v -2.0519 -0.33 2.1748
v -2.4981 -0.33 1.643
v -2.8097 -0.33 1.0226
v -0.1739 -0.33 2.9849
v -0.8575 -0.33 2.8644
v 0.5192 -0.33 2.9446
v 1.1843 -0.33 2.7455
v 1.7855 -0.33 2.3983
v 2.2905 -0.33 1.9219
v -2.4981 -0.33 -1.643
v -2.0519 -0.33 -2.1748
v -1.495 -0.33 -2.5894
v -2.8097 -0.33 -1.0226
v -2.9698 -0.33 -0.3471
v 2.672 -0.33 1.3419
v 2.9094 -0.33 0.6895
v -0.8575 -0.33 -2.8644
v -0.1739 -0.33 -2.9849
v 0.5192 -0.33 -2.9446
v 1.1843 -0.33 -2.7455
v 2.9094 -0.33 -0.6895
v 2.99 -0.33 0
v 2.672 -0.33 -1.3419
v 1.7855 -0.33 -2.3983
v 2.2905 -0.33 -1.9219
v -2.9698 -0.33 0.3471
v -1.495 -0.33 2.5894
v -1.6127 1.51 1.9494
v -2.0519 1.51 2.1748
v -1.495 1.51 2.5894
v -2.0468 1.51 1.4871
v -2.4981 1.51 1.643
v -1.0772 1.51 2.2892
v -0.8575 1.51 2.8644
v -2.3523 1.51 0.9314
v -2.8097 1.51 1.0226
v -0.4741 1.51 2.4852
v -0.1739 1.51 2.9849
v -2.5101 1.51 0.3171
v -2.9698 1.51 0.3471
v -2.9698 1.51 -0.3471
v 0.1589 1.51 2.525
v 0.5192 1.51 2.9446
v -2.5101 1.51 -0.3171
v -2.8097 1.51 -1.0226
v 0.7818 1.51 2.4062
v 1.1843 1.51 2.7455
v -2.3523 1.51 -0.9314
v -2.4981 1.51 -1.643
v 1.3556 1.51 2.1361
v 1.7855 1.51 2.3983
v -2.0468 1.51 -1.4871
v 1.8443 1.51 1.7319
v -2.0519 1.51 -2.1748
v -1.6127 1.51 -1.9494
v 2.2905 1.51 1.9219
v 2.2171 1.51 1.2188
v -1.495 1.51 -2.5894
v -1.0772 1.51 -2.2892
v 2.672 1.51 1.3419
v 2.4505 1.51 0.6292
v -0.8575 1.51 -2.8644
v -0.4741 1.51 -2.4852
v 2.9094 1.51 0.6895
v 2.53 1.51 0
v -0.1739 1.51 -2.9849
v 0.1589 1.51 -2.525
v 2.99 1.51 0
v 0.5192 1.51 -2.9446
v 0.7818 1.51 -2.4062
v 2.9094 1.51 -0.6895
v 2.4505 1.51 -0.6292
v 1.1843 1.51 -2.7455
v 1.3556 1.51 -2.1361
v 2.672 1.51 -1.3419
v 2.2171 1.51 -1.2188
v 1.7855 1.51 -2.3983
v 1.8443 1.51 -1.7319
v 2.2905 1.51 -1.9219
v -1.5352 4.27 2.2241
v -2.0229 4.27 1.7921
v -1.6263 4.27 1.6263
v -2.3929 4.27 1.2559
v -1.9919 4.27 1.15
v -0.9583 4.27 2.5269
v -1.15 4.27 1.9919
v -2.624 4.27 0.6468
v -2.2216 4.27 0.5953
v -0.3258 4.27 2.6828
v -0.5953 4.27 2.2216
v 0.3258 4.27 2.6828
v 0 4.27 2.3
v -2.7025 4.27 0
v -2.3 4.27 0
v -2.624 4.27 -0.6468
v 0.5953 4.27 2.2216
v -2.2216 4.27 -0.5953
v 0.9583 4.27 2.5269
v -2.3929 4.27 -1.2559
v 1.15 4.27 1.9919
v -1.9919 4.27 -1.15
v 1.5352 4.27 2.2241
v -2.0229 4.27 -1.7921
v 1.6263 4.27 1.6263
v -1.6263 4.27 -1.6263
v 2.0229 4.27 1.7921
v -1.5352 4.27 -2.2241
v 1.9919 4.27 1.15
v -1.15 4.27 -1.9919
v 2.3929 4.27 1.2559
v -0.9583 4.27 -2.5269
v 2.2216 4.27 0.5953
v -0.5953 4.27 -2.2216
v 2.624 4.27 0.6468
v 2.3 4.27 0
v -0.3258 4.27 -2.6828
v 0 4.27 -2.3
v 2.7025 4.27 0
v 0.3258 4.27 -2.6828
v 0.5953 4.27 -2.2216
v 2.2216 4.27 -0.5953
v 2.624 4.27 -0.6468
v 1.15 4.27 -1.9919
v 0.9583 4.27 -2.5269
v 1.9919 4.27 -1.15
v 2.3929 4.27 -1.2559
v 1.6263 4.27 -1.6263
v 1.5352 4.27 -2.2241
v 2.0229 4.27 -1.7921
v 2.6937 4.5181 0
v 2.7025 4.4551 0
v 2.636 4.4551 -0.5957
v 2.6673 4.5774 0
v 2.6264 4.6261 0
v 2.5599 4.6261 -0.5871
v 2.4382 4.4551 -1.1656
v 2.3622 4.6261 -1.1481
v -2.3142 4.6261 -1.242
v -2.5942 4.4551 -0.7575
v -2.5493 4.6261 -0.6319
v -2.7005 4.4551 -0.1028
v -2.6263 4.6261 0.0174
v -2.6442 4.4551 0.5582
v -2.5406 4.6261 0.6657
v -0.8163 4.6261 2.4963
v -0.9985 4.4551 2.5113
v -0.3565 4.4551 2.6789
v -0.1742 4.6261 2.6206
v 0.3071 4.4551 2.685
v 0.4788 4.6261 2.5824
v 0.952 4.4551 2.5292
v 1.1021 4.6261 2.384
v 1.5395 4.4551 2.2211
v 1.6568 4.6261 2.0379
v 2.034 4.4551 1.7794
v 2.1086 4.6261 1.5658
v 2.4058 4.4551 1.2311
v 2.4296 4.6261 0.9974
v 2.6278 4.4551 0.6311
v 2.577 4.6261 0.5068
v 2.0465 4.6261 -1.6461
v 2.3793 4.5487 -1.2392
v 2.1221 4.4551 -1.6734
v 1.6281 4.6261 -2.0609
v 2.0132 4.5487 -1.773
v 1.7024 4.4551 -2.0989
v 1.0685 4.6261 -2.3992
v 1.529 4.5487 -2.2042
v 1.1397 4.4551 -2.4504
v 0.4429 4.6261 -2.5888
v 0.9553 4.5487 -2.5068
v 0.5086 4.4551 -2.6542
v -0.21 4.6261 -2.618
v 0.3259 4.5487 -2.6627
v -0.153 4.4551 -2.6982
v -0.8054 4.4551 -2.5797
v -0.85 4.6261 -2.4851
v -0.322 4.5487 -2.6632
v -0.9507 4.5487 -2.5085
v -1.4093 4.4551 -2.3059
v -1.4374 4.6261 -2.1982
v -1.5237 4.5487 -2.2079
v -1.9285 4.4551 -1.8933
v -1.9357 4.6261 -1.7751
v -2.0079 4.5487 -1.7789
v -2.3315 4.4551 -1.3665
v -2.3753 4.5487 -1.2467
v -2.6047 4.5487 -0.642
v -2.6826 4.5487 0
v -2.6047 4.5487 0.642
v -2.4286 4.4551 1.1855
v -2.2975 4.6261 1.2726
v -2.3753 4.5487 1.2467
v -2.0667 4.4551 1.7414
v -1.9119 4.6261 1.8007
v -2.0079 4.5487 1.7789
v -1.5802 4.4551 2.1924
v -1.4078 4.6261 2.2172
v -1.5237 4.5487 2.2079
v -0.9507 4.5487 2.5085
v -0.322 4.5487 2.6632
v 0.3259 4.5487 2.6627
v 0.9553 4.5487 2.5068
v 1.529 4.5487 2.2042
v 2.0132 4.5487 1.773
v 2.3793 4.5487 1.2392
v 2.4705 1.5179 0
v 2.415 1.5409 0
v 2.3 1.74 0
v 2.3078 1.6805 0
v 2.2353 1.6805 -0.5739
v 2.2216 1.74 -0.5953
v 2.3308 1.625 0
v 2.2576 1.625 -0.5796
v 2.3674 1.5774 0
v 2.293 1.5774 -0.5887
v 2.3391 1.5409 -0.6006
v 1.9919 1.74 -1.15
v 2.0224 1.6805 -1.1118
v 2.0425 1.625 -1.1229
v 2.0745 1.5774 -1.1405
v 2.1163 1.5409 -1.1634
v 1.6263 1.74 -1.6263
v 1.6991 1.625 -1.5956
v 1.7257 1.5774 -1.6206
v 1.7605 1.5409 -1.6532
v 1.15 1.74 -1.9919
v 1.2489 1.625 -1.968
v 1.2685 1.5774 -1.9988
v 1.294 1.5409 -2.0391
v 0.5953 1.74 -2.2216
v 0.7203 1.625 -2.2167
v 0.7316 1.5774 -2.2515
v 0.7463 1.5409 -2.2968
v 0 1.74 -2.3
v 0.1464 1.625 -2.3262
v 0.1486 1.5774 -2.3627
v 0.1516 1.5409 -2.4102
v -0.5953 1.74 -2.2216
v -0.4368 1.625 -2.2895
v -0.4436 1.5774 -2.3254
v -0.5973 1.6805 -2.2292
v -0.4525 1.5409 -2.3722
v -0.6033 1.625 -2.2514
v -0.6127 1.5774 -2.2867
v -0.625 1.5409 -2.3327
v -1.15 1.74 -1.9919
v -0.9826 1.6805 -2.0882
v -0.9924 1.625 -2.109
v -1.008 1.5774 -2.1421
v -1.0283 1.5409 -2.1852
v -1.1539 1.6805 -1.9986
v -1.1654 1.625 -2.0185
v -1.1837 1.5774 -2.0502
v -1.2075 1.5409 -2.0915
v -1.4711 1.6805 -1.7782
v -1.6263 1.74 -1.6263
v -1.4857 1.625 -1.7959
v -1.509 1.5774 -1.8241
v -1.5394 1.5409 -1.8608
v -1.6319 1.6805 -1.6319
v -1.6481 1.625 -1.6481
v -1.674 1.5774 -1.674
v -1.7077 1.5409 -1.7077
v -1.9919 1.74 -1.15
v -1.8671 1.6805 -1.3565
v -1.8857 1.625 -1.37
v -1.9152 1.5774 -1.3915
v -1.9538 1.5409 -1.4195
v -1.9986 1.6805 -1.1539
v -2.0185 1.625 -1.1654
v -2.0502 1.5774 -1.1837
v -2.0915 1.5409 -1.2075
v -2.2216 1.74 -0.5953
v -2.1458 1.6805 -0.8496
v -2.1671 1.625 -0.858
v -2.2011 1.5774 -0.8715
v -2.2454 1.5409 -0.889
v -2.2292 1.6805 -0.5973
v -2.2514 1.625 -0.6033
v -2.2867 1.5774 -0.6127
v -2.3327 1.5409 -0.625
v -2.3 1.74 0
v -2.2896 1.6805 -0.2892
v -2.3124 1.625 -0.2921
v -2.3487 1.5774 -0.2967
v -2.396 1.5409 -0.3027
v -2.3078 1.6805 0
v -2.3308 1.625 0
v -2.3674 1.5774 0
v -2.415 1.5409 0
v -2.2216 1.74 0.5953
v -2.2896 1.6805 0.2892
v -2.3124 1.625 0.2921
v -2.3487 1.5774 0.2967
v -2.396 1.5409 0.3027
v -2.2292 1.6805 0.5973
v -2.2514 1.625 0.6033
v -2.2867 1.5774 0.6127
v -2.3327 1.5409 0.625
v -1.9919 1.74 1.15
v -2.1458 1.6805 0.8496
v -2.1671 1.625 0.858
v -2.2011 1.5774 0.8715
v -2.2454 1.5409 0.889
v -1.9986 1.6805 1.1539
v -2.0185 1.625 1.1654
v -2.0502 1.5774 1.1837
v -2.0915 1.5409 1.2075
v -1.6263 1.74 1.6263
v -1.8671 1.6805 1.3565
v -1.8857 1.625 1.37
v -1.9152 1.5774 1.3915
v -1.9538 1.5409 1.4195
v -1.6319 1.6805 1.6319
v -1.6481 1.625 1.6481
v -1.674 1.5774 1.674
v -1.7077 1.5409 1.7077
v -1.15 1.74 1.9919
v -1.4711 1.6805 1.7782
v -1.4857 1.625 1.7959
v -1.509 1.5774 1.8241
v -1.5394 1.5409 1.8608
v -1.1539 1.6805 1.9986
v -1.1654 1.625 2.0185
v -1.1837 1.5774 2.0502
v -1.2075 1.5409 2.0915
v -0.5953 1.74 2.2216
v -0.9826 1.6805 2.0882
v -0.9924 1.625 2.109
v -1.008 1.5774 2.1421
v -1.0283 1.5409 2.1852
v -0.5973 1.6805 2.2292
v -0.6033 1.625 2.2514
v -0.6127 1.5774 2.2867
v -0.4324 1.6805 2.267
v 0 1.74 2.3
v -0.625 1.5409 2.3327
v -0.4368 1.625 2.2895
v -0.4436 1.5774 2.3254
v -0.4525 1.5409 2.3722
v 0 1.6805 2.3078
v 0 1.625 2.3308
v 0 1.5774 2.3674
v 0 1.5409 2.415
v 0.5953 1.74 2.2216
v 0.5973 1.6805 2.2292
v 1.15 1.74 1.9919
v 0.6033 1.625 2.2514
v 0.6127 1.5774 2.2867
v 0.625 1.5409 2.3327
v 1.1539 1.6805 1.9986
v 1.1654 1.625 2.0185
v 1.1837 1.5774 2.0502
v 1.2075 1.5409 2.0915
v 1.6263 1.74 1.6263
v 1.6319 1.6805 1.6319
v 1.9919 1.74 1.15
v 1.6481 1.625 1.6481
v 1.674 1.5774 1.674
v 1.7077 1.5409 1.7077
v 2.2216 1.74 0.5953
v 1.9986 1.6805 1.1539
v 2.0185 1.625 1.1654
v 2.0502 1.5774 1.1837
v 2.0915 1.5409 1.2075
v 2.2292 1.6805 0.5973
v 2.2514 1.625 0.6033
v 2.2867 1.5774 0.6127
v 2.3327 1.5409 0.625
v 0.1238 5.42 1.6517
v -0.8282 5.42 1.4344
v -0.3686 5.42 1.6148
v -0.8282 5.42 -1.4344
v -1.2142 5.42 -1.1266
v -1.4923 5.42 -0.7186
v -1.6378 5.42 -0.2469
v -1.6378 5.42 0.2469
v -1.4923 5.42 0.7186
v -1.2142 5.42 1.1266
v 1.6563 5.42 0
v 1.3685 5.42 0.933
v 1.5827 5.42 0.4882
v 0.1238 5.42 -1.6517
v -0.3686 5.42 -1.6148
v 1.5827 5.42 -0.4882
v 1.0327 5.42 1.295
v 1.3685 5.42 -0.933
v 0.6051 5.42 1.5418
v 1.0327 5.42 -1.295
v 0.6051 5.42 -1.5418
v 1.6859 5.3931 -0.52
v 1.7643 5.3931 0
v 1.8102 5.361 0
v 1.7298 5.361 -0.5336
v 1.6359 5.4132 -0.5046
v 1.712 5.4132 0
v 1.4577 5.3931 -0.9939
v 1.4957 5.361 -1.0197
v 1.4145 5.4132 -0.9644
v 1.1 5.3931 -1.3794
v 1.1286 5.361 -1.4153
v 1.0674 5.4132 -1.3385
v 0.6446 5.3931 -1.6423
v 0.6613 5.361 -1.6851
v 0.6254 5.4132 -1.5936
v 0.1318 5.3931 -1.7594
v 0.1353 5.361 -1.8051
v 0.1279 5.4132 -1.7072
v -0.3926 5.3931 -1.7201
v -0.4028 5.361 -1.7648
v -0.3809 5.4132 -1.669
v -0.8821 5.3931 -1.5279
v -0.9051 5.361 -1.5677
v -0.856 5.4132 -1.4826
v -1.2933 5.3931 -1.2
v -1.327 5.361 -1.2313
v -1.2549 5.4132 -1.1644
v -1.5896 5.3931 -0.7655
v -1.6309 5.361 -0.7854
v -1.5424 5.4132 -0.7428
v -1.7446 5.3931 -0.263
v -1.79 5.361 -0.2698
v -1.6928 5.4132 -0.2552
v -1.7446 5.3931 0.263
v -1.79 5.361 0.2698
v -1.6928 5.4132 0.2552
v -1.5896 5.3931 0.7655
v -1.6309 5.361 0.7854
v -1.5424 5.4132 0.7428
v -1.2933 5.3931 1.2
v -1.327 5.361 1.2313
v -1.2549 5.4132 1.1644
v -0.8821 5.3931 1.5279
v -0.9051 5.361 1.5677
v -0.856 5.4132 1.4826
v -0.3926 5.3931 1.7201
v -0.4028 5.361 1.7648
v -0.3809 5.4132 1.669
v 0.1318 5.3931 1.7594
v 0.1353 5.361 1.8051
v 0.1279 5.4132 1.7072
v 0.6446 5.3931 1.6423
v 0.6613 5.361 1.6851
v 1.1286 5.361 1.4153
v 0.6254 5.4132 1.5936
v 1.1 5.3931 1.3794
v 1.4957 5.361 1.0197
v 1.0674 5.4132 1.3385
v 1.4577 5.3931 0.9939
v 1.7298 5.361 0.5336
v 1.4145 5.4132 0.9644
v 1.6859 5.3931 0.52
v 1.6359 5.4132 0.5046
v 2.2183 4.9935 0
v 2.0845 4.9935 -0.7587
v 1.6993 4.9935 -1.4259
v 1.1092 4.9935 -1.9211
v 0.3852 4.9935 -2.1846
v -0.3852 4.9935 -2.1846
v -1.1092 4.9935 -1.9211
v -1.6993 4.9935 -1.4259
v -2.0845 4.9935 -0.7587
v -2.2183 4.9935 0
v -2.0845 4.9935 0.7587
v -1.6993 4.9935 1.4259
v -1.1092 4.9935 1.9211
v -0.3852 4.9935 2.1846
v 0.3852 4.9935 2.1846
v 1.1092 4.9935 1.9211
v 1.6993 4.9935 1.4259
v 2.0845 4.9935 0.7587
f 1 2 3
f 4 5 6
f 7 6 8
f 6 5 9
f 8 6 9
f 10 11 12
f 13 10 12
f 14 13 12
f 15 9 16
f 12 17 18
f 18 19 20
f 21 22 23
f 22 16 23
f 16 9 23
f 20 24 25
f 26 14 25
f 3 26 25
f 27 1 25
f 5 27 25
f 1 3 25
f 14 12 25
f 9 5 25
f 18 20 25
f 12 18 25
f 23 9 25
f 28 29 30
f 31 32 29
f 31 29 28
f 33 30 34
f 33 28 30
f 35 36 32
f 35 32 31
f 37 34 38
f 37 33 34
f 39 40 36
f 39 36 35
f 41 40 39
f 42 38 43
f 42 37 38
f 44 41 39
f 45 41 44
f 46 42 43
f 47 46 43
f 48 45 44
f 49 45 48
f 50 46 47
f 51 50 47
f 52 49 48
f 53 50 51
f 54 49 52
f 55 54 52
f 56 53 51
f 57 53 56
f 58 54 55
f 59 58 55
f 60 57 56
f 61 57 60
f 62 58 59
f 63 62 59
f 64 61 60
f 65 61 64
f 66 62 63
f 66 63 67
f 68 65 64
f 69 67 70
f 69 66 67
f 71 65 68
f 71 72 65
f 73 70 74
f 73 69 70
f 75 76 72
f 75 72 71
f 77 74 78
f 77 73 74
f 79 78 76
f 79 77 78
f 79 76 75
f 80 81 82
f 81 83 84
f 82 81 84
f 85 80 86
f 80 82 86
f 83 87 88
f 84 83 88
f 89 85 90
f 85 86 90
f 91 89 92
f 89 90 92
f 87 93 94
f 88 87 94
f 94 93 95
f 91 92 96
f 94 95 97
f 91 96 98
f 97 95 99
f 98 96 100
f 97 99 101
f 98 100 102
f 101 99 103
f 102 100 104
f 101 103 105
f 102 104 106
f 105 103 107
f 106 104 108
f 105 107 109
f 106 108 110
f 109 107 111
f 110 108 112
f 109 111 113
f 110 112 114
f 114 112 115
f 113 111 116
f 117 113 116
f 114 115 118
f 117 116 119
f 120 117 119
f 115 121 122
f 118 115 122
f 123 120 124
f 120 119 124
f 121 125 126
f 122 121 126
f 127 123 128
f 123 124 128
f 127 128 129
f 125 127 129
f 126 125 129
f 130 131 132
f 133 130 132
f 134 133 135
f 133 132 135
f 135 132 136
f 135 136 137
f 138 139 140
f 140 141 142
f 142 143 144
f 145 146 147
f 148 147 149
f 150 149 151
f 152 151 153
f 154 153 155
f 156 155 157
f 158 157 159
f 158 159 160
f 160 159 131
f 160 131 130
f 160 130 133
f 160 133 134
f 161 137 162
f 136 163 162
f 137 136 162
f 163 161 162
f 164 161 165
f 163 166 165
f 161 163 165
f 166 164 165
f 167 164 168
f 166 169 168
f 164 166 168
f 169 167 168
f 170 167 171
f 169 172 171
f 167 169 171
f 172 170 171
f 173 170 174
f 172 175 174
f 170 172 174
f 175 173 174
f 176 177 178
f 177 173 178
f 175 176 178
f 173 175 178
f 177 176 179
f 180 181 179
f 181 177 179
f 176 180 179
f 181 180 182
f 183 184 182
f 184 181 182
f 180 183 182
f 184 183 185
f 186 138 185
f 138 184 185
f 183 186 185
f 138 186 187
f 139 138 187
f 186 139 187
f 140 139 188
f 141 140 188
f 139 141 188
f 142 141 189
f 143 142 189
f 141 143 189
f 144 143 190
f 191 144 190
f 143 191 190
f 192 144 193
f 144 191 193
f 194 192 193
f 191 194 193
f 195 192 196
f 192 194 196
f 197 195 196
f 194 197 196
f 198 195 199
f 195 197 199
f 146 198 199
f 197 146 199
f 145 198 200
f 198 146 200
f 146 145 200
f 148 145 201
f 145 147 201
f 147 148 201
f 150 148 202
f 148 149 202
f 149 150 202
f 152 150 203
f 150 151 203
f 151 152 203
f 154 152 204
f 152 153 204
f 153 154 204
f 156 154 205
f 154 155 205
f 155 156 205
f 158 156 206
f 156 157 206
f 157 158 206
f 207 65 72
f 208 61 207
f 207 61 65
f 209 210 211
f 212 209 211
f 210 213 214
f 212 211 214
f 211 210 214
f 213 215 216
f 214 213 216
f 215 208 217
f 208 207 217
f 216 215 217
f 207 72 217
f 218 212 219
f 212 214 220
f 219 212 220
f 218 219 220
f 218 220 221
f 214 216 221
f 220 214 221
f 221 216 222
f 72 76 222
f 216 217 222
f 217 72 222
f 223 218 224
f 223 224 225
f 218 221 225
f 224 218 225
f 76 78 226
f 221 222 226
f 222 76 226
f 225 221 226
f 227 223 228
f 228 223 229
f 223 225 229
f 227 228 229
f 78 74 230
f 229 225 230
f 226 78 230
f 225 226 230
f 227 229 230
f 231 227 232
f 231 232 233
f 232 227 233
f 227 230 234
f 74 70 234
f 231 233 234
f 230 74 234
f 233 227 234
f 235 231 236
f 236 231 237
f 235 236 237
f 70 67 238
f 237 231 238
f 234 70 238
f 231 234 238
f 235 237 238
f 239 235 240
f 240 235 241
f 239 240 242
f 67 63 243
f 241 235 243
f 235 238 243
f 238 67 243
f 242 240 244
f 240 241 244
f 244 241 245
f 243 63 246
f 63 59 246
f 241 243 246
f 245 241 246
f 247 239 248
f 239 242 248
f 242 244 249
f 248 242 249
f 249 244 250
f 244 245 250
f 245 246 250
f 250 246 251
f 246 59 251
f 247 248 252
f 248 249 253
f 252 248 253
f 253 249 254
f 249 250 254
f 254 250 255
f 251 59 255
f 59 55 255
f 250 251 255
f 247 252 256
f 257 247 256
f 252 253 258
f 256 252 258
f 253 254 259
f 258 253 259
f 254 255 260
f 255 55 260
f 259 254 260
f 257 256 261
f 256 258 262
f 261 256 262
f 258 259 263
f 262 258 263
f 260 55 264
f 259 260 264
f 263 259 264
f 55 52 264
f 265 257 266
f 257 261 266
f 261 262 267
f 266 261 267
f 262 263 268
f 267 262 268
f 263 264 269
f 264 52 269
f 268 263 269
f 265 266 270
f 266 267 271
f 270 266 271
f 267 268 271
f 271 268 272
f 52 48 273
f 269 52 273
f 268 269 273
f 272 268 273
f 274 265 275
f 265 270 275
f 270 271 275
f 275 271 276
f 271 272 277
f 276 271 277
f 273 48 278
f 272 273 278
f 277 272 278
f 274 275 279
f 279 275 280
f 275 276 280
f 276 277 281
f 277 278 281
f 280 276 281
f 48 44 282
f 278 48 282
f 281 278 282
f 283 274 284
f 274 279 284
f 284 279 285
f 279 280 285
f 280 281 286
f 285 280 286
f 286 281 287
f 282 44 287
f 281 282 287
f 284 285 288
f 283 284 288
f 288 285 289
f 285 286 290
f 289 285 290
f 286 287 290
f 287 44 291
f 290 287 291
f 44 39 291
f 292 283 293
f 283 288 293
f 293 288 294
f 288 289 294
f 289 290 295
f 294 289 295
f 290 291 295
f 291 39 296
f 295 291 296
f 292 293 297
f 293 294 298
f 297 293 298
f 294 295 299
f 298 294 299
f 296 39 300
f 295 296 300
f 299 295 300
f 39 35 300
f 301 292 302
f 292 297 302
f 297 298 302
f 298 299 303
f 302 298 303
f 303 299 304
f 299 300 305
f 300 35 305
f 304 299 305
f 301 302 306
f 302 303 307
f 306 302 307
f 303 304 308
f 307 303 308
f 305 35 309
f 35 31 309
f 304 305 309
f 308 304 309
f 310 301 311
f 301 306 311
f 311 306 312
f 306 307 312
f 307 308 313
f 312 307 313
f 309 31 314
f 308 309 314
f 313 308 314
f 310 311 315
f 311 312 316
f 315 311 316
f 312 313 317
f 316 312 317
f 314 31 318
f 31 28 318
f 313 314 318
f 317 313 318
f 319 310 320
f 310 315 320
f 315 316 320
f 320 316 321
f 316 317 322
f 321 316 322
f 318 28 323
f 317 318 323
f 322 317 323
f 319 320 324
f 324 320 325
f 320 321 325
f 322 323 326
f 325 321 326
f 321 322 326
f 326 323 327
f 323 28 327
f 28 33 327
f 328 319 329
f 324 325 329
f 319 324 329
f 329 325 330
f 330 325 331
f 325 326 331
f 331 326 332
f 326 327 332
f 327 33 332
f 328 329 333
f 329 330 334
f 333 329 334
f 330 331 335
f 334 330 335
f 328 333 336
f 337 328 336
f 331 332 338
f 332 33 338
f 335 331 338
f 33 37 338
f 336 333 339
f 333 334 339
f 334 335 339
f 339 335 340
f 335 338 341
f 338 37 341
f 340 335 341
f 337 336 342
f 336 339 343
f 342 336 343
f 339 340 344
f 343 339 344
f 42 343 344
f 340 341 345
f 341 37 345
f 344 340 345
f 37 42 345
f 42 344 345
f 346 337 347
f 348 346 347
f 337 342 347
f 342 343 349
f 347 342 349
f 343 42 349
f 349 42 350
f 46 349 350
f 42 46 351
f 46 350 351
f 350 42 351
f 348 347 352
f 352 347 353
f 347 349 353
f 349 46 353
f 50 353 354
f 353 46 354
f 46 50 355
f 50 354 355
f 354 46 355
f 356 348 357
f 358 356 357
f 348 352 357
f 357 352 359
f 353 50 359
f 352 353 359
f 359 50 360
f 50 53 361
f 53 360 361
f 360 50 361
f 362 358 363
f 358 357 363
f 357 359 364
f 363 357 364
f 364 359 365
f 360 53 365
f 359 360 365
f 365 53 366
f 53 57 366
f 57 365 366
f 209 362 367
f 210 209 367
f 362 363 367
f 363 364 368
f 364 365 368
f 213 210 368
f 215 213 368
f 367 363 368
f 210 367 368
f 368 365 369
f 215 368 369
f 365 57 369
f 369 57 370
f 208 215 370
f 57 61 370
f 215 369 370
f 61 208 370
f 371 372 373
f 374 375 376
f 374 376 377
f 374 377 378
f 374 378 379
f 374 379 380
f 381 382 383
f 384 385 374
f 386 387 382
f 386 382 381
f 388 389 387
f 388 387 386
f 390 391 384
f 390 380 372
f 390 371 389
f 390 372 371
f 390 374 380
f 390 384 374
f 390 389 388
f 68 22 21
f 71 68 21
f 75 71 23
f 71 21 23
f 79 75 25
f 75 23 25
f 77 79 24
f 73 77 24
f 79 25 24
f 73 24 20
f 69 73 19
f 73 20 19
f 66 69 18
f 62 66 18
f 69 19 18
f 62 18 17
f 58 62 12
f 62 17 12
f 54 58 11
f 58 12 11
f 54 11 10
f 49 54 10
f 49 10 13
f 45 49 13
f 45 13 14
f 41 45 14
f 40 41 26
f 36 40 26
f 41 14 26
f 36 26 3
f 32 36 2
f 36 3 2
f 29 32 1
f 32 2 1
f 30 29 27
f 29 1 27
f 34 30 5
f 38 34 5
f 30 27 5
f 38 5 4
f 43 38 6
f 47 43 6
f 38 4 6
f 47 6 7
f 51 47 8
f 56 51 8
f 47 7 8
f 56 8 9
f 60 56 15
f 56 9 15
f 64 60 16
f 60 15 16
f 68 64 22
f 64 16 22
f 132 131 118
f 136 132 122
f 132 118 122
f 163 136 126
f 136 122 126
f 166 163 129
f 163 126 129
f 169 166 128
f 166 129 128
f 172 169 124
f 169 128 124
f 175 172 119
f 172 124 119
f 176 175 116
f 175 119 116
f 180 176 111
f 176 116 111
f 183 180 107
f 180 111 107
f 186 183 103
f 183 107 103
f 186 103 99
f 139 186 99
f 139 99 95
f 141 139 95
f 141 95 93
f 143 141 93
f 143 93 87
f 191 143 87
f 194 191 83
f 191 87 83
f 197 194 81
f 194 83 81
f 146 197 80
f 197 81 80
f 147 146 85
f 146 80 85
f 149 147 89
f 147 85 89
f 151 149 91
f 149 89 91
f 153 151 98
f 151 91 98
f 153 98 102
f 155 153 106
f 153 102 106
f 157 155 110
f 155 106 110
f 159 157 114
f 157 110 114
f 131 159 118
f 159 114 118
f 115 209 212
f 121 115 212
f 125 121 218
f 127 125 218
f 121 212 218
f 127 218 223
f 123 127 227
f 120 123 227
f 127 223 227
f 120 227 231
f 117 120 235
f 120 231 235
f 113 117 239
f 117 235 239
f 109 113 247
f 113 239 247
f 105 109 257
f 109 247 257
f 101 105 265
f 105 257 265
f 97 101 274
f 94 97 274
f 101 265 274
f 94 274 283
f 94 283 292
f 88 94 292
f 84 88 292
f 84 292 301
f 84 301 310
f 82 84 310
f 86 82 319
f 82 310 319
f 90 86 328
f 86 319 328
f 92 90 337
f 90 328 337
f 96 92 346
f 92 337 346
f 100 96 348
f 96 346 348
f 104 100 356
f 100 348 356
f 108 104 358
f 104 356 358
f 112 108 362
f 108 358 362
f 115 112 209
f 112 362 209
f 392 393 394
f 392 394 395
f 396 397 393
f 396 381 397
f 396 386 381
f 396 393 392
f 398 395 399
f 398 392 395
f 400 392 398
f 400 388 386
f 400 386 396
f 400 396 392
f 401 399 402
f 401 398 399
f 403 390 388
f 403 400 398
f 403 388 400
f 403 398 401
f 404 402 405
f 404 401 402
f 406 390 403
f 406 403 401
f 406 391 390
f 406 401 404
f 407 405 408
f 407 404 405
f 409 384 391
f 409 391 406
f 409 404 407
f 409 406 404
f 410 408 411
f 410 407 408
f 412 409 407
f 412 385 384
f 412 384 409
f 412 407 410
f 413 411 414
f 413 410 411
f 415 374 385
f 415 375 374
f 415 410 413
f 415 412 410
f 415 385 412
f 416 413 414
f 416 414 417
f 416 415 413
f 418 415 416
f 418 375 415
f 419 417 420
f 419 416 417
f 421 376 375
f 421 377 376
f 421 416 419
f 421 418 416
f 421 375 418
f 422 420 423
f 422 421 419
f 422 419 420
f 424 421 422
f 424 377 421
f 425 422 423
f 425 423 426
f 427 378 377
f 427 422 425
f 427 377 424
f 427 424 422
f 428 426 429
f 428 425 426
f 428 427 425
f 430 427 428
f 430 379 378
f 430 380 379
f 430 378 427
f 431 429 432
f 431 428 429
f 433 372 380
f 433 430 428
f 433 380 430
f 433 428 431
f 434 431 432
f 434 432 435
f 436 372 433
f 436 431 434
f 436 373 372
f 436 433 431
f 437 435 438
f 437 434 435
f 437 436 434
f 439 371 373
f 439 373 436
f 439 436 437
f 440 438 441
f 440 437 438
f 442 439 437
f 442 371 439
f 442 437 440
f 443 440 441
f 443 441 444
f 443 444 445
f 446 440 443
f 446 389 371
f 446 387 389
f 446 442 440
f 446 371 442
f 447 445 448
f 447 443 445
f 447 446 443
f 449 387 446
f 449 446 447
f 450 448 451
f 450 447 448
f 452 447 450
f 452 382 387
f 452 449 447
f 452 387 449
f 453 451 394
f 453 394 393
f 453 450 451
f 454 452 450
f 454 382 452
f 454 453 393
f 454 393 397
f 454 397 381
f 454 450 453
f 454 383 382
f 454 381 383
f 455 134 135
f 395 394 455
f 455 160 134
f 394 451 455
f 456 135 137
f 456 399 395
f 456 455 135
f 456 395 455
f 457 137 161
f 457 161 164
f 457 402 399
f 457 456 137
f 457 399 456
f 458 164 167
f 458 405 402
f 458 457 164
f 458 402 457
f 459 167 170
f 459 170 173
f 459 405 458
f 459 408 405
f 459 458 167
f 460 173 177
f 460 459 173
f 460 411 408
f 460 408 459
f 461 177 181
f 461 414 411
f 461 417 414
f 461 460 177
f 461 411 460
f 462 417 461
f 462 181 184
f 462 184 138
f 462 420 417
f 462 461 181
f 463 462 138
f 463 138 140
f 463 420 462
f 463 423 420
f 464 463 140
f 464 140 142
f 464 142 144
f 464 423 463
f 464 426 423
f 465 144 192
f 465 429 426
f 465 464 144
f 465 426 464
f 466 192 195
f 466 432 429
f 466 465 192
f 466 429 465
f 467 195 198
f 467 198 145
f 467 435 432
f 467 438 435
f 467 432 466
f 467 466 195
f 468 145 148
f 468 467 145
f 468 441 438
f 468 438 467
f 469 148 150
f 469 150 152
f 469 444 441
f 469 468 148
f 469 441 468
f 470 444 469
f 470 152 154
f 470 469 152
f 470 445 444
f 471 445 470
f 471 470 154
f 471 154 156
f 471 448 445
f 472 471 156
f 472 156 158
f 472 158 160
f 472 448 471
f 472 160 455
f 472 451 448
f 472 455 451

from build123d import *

# Parameters (mm, degrees)
SKETCH1_R           = 2.6
BOSS_EXTRUDE1_DEPTH = 1.6
SKETCH2_R           = 2
BOSS_EXTRUDE2_DEPTH = 2.4
SKETCH3_R           = 2.35
BOSS_EXTRUDE3_DEPTH = 1
CHAMFER1_SIZE       = 0.75
CHAMFER1_SIZE2      = 0.832959386
FILLET1_R           = 0.2
SCALE1_SCALE        = 1.15


with BuildPart() as part:
    # Sketch1 → Boss-Extrude1 (new body)
    with BuildSketch(Plane(origin=(0, 0, 0), x_dir=(1, 0, 0), z_dir=(0, 1, 0))):
        Circle(SKETCH1_R)
    extrude(amount=BOSS_EXTRUDE1_DEPTH)

    # Sketch2 → Boss-Extrude2 (add)
    with BuildSketch(Plane(origin=(0, 1.6, 0), x_dir=(1, 0, 0), z_dir=(0, 1, 0))):
        Circle(SKETCH2_R)
    extrude(amount=BOSS_EXTRUDE2_DEPTH)

    # Sketch3 → Boss-Extrude3 (add)
    with BuildSketch(Plane(origin=(0, 4, 0), x_dir=(1, 0, 0), z_dir=(0, 1, 0))):
        Circle(SKETCH3_R)
    extrude(amount=BOSS_EXTRUDE3_DEPTH)

    # Chamfer1
    chamfer1_edges = [part.edges().sort_by_distance(p)[0] for p in [
        (-2.35, 5, 0),
    ]]
    chamfer1_side = [part.faces().sort_by_distance(p)[0] for p in [
        (-2.35, 4.5, 0),
    ]]
    chamfer(chamfer1_edges, length=CHAMFER1_SIZE, length2=CHAMFER1_SIZE2, reference=chamfer1_side[0])

    # Fillet1
    fillet1_edges = [part.edges().sort_by_distance(p)[0] for p in [
        (-1.517040614, 5, 0),
        (-2.35, 4.25, 0),
        (-2, 1.6, 0),
    ]]
    fillet(fillet1_edges, radius=FILLET1_R)


with BuildPart() as part_1:
    # Scale1: scaled about (-4.4e-08, 2.199734094, 0)
    add(part.part.scale(SCALE1_SCALE).moved(Location((7e-09, -0.329960114, 0))))


solid = part_1.part
